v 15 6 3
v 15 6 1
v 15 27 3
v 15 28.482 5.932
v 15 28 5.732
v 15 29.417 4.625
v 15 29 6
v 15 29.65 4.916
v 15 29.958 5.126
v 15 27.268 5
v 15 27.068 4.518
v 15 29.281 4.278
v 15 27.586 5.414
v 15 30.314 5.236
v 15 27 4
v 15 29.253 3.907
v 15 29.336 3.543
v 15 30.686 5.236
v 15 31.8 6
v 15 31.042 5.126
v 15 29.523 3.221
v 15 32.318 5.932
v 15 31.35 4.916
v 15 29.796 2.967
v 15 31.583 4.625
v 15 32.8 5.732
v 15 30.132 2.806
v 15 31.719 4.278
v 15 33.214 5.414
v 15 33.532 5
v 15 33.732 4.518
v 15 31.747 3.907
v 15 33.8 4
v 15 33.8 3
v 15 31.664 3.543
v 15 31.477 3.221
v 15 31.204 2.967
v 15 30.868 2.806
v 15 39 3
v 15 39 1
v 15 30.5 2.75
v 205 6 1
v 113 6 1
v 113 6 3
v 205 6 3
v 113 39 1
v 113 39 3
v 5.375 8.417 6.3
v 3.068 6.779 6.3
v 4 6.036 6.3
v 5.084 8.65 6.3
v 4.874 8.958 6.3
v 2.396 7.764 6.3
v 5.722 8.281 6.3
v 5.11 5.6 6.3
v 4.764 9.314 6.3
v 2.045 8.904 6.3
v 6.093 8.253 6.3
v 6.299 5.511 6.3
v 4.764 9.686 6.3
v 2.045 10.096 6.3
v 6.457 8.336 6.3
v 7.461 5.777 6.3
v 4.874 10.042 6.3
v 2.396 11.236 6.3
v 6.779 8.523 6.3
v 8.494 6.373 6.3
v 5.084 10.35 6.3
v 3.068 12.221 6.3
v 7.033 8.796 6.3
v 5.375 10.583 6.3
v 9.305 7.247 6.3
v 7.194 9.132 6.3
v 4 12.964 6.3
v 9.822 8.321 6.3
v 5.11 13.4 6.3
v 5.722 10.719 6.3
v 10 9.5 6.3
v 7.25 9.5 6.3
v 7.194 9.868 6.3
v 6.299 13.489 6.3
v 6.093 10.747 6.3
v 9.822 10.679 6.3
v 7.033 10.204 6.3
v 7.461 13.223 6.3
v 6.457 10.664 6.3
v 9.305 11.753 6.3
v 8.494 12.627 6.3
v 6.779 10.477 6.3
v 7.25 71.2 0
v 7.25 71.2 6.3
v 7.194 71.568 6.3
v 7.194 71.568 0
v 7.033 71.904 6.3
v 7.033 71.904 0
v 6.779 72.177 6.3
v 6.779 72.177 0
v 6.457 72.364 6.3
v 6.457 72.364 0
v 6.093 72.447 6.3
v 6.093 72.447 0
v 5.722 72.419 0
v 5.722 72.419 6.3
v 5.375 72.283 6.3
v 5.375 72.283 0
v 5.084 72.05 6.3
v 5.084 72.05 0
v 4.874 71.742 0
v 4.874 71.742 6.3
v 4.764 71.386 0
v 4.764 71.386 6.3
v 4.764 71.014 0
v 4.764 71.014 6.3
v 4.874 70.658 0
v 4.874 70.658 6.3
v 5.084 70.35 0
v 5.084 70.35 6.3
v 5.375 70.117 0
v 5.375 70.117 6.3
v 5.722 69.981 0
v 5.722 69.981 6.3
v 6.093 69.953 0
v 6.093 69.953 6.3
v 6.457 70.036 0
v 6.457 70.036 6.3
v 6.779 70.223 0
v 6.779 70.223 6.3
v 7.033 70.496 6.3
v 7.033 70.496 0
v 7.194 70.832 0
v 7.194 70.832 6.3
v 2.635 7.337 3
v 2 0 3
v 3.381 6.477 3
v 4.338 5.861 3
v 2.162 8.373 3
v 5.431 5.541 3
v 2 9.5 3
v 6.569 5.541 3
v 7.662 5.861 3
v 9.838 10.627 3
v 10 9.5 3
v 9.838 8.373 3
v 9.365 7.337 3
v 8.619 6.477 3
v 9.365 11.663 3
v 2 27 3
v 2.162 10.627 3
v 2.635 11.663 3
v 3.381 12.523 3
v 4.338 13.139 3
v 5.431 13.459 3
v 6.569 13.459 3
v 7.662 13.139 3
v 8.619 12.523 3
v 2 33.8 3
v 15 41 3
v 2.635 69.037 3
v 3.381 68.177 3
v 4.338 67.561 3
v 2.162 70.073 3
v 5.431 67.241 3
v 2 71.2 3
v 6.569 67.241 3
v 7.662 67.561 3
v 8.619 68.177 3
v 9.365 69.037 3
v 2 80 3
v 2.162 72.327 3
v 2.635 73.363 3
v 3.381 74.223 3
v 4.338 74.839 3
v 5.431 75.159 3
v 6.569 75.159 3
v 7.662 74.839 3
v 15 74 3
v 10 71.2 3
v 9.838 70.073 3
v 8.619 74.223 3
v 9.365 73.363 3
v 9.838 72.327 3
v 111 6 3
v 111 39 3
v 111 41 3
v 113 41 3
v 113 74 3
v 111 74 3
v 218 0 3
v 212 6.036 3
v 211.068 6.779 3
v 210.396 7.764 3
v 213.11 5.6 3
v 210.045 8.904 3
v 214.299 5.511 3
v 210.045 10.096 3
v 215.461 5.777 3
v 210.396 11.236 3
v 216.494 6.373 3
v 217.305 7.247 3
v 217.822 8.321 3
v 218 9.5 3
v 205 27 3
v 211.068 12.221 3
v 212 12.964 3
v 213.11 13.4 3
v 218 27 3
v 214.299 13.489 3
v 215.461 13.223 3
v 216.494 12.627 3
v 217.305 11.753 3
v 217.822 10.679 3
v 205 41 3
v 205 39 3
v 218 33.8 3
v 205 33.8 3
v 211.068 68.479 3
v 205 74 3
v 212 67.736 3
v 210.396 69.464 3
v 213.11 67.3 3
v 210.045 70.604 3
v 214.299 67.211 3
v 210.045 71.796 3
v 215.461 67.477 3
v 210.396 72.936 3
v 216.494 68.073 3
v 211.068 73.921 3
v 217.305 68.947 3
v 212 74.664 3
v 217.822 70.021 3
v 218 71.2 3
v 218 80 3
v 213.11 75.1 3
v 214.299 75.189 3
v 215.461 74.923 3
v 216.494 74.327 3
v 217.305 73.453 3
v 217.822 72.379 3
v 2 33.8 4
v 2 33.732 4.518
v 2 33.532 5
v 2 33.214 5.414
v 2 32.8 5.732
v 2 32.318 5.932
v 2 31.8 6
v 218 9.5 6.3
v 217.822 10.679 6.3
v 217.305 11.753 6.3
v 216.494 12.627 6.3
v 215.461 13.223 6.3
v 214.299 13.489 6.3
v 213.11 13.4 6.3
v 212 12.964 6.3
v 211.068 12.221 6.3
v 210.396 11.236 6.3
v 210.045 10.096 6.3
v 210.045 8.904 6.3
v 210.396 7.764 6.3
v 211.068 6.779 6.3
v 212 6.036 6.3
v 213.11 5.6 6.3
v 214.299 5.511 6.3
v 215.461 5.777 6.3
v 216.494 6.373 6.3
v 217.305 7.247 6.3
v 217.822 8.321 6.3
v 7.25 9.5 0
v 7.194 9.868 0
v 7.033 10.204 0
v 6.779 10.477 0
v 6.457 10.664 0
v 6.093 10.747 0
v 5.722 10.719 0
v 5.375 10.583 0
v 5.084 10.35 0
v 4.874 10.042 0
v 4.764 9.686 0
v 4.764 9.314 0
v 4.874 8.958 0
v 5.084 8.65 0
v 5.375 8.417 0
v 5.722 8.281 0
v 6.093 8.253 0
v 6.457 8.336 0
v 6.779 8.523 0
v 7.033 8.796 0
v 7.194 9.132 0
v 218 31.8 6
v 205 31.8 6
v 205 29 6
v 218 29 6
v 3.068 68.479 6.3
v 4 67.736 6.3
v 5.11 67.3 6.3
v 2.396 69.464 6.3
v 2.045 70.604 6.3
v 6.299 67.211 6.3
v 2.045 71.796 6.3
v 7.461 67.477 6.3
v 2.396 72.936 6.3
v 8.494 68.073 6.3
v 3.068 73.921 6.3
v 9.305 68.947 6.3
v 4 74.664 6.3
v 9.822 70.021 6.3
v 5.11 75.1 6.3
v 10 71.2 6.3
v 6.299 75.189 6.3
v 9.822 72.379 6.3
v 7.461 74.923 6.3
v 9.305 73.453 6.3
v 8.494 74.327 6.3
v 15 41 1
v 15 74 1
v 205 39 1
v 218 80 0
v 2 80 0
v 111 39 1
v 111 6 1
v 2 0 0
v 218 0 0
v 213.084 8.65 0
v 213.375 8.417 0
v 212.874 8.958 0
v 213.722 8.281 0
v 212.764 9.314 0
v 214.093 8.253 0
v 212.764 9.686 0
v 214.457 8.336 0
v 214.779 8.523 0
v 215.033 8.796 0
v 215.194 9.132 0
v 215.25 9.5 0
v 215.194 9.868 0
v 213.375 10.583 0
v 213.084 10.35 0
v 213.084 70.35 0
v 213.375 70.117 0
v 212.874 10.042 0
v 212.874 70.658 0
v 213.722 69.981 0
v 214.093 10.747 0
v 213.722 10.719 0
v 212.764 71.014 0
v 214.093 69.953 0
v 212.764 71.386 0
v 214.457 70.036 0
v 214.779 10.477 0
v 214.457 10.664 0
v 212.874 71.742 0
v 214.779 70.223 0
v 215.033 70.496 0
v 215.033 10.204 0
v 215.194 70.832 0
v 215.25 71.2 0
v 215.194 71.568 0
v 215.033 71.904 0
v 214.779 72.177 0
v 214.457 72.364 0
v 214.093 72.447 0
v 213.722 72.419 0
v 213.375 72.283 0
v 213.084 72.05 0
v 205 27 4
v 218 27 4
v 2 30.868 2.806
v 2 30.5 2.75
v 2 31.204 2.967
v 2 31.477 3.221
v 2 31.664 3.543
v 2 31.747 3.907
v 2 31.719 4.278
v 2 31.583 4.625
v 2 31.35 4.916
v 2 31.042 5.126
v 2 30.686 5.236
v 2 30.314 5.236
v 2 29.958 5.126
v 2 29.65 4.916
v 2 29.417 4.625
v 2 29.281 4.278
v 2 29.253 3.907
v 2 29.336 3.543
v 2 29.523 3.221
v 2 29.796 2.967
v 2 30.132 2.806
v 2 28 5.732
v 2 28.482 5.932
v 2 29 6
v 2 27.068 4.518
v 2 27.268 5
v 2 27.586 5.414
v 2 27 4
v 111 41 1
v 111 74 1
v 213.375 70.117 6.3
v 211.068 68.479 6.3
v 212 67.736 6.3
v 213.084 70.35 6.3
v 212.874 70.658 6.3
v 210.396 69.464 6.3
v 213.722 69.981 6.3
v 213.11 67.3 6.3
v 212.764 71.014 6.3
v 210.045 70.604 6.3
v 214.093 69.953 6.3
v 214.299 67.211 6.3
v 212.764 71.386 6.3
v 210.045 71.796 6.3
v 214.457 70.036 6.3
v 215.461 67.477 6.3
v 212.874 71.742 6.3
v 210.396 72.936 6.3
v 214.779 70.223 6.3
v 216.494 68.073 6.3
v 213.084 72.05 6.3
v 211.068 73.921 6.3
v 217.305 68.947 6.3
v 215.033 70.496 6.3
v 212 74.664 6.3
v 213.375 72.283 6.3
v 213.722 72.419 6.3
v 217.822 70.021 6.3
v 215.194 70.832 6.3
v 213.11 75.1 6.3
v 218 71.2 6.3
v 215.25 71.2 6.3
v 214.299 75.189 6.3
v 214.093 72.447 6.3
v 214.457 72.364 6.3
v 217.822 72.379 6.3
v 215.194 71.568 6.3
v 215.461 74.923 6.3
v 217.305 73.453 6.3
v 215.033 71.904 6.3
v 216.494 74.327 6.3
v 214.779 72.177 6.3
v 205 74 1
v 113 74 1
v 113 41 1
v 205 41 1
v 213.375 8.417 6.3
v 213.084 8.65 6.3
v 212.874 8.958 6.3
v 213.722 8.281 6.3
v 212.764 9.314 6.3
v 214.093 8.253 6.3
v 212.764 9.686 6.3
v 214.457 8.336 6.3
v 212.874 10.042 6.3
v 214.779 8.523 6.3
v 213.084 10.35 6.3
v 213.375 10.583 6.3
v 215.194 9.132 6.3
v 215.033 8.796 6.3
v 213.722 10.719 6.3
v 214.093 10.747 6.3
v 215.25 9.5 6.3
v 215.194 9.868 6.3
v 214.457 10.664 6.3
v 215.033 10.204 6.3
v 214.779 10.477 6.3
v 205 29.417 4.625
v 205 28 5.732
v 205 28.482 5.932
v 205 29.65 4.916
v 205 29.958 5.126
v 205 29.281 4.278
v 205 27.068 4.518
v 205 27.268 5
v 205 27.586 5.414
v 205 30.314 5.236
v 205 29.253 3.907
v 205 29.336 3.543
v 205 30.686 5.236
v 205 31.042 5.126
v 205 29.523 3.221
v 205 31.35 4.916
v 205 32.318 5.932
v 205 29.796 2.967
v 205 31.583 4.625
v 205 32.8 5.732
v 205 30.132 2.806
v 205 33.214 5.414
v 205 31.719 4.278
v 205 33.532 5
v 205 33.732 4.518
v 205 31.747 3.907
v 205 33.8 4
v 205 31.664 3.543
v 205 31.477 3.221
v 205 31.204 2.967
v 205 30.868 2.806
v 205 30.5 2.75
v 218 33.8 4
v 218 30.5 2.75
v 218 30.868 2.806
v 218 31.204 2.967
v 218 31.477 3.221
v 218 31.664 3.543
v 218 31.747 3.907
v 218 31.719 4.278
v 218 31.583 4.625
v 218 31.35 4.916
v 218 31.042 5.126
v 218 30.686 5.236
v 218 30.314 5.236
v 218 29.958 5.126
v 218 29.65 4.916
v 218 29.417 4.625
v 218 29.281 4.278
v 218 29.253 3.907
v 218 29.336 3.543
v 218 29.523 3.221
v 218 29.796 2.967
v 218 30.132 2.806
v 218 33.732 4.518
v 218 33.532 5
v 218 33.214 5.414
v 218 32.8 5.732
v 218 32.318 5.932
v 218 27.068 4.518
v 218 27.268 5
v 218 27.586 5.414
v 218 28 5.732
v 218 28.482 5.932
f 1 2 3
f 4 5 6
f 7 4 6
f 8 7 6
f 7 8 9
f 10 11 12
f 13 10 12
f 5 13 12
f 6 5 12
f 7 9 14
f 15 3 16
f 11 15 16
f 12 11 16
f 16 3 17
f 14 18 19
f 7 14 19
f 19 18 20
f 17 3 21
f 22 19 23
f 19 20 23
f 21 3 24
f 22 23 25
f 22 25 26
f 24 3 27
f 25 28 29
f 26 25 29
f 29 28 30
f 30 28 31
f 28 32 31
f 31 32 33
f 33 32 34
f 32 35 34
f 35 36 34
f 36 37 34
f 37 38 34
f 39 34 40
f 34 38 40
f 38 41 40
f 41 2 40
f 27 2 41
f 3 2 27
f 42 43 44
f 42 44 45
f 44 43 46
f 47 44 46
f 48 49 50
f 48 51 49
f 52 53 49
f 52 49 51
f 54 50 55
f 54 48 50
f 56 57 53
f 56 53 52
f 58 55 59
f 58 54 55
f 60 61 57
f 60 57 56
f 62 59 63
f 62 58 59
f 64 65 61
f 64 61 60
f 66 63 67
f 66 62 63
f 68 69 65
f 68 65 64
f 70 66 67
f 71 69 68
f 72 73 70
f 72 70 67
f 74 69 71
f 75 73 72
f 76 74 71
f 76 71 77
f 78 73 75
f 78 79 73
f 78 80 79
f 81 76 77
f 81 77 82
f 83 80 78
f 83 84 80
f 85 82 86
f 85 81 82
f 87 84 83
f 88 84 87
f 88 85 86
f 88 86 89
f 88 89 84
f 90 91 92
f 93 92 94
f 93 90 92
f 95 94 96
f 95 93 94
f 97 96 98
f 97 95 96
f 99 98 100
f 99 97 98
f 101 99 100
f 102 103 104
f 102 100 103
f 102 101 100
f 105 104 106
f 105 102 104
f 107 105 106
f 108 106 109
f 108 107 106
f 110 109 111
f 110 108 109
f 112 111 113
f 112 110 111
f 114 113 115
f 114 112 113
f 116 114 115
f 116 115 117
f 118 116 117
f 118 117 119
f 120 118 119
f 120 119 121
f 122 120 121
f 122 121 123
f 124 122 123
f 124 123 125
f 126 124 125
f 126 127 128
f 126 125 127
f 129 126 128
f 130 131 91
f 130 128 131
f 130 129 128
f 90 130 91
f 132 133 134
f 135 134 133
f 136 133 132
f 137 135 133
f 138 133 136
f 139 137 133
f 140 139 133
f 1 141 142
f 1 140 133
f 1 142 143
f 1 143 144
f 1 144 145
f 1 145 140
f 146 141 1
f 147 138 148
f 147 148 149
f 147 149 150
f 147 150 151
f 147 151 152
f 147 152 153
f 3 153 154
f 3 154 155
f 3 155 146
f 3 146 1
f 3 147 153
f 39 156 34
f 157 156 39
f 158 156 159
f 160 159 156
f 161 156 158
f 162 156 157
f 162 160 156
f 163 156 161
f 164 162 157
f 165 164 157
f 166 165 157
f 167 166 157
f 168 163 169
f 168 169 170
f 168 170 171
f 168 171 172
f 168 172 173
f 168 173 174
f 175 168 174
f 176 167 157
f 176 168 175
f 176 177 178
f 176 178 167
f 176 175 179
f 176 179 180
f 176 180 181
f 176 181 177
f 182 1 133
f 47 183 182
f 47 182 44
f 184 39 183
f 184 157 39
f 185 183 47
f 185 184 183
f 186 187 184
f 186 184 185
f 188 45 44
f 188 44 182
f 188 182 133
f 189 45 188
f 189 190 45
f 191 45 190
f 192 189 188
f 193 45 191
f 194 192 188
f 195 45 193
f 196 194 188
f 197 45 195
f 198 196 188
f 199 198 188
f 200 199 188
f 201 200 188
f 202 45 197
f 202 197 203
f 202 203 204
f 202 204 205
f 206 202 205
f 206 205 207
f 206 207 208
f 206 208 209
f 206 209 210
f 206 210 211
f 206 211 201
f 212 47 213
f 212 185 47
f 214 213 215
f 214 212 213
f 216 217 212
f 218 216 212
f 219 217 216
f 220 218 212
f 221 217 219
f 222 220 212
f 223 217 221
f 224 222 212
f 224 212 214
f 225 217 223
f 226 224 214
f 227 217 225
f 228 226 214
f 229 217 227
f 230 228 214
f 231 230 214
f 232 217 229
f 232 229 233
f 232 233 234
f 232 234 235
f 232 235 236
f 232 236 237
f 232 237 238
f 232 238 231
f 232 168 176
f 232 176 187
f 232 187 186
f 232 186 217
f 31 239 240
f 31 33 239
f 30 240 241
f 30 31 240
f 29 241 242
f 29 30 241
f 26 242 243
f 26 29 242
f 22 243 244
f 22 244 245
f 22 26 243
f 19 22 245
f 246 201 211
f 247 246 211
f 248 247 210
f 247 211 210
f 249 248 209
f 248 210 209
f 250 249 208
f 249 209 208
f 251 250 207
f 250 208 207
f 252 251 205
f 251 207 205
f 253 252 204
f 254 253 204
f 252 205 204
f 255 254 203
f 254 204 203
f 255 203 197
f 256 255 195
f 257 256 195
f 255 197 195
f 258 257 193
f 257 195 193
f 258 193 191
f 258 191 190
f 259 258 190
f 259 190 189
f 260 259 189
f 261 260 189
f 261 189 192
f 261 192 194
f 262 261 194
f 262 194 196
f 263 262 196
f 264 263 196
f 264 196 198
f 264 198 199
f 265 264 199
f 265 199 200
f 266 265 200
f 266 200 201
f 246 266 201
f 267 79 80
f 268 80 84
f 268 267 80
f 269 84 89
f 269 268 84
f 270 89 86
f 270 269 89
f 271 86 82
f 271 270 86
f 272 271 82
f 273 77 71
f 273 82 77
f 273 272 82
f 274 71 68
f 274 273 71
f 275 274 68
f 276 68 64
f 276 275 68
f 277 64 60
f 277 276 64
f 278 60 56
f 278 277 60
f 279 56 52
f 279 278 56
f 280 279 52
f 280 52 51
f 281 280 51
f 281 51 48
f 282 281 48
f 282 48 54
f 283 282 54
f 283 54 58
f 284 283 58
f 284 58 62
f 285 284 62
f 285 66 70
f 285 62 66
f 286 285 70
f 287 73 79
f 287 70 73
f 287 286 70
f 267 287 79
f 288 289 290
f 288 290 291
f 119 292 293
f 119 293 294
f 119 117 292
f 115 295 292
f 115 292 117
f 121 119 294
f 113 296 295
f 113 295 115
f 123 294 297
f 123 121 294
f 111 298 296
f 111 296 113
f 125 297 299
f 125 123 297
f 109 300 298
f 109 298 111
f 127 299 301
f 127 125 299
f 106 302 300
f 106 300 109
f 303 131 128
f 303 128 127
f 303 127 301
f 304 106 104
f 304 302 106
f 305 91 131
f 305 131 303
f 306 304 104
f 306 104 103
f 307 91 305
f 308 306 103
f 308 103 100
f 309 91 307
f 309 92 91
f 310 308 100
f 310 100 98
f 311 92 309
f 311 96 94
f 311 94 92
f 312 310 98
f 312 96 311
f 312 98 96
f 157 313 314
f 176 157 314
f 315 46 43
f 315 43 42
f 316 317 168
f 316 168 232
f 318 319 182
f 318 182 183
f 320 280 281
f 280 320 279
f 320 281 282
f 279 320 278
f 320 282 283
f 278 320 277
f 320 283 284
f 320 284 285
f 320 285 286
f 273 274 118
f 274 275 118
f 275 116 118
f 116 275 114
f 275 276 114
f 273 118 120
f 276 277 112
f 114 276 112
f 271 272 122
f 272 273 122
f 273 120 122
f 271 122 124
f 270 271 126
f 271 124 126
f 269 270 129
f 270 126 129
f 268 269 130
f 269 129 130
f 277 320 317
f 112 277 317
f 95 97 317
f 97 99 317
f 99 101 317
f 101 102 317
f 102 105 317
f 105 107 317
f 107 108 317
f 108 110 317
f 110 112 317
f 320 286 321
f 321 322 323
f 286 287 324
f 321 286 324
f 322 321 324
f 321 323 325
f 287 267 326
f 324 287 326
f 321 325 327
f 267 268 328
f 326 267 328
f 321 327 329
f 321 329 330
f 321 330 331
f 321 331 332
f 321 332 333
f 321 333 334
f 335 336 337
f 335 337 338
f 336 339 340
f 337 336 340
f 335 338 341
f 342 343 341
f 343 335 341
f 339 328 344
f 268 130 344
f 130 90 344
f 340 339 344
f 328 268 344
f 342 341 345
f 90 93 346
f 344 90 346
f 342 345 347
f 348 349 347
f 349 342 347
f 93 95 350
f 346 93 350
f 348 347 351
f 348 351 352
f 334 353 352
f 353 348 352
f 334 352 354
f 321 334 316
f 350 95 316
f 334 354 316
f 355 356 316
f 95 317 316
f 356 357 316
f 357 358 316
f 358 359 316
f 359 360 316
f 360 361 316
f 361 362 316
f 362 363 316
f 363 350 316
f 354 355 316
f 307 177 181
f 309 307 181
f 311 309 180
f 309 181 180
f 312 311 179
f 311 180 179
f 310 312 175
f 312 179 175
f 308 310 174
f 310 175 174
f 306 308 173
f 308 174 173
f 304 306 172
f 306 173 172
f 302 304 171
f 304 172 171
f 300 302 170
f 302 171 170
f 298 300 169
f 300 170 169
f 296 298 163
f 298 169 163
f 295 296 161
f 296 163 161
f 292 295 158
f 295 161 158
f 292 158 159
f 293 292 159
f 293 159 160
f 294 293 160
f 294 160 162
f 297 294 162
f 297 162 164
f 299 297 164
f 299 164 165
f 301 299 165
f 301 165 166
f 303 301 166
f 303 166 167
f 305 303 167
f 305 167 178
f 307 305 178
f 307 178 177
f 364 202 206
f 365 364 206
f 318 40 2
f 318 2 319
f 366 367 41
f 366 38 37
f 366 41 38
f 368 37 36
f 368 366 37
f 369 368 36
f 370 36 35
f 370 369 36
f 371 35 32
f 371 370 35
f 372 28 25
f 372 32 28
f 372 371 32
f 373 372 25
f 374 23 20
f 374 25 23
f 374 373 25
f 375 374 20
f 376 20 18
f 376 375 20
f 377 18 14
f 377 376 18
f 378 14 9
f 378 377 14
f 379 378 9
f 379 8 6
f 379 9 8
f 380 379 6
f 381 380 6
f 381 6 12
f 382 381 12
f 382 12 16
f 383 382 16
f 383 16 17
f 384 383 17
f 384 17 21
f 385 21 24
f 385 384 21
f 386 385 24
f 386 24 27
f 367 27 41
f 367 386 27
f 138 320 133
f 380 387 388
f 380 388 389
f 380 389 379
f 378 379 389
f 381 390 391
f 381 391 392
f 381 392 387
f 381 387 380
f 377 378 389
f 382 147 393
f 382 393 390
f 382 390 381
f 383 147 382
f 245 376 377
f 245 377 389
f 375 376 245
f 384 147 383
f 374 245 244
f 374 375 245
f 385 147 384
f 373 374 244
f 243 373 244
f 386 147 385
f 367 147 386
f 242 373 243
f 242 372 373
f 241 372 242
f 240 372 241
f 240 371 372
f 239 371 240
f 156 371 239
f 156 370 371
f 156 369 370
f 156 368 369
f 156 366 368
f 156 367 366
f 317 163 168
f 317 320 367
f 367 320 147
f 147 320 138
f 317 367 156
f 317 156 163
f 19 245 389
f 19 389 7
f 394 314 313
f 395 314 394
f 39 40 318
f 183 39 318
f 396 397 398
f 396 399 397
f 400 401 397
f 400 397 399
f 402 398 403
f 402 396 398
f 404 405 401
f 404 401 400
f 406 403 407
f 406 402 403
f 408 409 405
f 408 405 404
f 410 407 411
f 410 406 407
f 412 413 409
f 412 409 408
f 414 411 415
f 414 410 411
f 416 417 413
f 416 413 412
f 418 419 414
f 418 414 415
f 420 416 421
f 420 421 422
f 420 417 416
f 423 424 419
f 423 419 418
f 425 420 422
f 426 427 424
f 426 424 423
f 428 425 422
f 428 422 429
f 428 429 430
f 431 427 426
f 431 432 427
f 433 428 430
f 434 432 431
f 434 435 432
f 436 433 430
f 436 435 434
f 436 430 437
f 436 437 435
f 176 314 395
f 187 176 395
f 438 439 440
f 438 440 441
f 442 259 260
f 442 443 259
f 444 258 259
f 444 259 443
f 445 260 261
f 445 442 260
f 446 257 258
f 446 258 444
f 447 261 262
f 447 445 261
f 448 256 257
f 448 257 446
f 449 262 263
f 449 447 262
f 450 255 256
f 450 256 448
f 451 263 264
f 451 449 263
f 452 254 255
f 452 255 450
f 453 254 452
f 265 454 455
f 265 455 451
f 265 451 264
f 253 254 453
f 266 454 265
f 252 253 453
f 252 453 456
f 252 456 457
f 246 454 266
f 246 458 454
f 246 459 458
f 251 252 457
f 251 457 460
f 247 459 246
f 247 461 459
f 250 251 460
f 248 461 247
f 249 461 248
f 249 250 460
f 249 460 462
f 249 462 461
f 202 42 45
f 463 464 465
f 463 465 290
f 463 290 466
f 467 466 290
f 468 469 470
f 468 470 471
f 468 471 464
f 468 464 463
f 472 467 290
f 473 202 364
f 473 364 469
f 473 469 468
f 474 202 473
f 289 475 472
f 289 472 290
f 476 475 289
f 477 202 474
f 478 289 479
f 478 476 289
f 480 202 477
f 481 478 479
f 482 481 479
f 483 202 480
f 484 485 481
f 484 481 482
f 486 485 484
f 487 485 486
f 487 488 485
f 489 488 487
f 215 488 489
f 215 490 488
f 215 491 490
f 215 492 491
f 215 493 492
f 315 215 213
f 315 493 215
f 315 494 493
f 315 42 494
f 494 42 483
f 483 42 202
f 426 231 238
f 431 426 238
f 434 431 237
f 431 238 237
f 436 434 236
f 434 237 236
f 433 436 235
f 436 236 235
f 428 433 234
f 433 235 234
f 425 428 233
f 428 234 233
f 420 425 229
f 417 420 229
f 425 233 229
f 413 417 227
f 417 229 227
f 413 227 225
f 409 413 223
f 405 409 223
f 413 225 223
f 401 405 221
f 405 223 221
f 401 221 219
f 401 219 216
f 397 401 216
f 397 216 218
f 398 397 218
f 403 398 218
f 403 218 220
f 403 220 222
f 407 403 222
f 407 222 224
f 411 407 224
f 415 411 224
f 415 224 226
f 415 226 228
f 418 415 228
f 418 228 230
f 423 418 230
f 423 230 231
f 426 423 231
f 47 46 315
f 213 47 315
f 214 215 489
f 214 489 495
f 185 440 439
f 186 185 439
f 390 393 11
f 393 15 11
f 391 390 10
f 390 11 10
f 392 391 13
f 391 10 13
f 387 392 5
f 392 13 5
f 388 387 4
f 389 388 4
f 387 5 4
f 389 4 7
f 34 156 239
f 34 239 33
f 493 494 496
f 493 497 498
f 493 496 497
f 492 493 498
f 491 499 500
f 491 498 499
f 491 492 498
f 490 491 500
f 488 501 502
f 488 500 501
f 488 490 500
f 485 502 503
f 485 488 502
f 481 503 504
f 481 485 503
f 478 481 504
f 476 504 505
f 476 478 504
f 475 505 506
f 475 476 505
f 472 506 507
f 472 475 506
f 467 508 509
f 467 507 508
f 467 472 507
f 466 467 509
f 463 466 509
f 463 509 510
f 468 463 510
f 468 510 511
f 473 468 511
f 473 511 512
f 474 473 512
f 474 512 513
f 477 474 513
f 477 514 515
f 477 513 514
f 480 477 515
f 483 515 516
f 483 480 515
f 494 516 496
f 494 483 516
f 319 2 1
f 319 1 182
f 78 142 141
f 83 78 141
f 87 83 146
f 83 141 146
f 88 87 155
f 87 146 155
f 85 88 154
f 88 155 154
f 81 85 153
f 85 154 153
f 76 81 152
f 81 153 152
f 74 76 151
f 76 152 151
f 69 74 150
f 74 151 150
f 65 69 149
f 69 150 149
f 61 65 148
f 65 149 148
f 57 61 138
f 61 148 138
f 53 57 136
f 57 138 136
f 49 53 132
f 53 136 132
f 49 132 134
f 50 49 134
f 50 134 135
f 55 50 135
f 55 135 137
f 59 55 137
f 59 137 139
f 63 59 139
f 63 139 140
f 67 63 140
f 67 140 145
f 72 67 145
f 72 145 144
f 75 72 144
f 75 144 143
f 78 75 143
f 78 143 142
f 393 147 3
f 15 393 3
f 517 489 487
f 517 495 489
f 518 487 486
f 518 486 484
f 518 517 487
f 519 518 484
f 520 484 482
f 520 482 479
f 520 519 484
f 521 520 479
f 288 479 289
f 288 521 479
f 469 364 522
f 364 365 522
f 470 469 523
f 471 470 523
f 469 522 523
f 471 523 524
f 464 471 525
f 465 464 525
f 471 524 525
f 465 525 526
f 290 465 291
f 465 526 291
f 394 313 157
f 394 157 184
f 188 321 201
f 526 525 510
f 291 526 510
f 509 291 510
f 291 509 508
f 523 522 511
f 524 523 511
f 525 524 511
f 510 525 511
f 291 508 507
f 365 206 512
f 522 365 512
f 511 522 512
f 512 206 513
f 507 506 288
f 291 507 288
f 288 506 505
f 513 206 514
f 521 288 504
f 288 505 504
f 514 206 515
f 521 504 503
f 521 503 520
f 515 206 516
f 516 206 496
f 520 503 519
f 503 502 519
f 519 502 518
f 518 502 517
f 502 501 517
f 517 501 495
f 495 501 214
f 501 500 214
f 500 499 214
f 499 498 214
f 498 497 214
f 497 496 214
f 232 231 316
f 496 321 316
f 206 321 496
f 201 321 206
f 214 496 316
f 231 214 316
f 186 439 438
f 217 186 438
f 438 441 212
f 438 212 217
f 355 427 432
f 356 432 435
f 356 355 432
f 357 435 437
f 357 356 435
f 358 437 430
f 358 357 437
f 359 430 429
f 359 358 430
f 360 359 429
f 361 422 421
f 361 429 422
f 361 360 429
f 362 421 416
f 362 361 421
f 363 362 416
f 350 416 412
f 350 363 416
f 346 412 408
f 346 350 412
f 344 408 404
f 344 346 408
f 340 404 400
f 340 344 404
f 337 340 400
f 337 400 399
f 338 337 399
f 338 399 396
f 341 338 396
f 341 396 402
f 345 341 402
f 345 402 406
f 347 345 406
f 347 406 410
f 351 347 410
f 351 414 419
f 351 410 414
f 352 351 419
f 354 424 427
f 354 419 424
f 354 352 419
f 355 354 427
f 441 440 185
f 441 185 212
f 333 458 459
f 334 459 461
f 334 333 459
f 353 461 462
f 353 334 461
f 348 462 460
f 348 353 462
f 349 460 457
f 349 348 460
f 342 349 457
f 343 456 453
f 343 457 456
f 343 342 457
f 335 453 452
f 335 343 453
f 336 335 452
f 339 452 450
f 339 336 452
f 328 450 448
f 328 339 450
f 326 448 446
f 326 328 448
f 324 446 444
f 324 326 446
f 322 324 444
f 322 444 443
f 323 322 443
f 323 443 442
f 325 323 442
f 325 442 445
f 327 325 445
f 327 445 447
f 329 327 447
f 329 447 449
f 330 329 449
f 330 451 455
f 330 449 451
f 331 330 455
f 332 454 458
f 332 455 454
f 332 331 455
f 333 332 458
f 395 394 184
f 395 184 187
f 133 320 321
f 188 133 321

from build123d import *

# Parameters (mm, degrees)
CYLINDER010_R     = 1.25
CYLINDER010_DEPTH = 20
CYLINDER011_R     = 1.25
CYLINDER011_DEPTH = 20
BOX009_W          = 13
BOX009_H          = 6.8
BOX009_DEPTH      = 6
FILLET002_R       = 2
CYLINDER004_R     = 1.25
CYLINDER004_DEPTH = 7
CYLINDER002_R     = 1.25
CYLINDER002_DEPTH = 7
CYLINDER003_R     = 1.25
CYLINDER003_DEPTH = 7
CYLINDER_R        = 1.25
CYLINDER_DEPTH    = 7
BOX002_W          = 190
BOX002_H          = 68
BOX002_DEPTH      = 3
CYLINDER005_R     = 4
CYLINDER005_DEPTH = 6.3
CYLINDER006_R     = 4
CYLINDER006_DEPTH = 6.3
CYLINDER001_R     = 4
CYLINDER001_DEPTH = 6.3
BOX_W             = 216
BOX_H             = 80
BOX_DEPTH         = 3
CYLINDER007_R     = 4
CYLINDER007_DEPTH = 6.3
BOX003_W          = 2
BOX003_H          = 68
BOX003_DEPTH      = 2
BOX004_W          = 190
BOX004_H          = 2
BOX004_DEPTH      = 2
BOX021_W          = 13
BOX021_H          = 6.8
BOX021_DEPTH      = 6
FILLET002004_R    = 2


with BuildPart() as cylinder009:
    # Cylinder010 → Cylinder010 (new body)
    with BuildSketch(Plane(origin=(0, 30.5, 4), x_dir=(0, 0, -1), z_dir=(1, 0, 0))):
        Circle(CYLINDER010_R)
    extrude(amount=CYLINDER010_DEPTH)


with BuildPart() as fusion005:
    # Cylinder011 → Cylinder011 (new body)
    with BuildSketch(Plane(origin=(204, 30.5, 4), x_dir=(0, 0, -1), z_dir=(1, 0, 0))):
        Circle(CYLINDER011_R)
    extrude(amount=CYLINDER011_DEPTH)

    # Fusion005: union Cylinder009
    add(cylinder009.part)


with BuildPart() as fillet002:
    # Box009 → Box009 (new body)
    with BuildSketch(Plane(origin=(2, 29, 0), x_dir=(1, 0, 0), z_dir=(0, 0, 1))):
        with Locations((6.5, 3.4)):
            Rectangle(BOX009_W, BOX009_H)
    extrude(amount=BOX009_DEPTH)

    # Fillet002
    fillet002_edges = [fillet002.edges().sort_by_distance(p)[0] for p in [
        (8.5, 29, 6),
        (8.5, 35.8, 6),
    ]]
    fillet(fillet002_edges, radius=FILLET002_R)


with BuildPart() as fillet002_1:
    # Fillet002 placement: moved
    add(fillet002.part.moved(Location((0, -2, 0))))


with BuildPart() as screwhole003:
    # Cylinder004 → Cylinder004 (new body)
    with BuildSketch(Plane(origin=(214, 9.5, 0), x_dir=(1, 0, 0), z_dir=(0, 0, 1))):
        Circle(CYLINDER004_R)
    extrude(amount=CYLINDER004_DEPTH)


with BuildPart() as screwhole001:
    # Cylinder002 → Cylinder002 (new body)
    with BuildSketch(Plane(origin=(6, 71.2, 0), x_dir=(1, 0, 0), z_dir=(0, 0, 1))):
        Circle(CYLINDER002_R)
    extrude(amount=CYLINDER002_DEPTH)


with BuildPart() as screwhole002:
    # Cylinder003 → Cylinder003 (new body)
    with BuildSketch(Plane(origin=(214, 71.2, 0), x_dir=(1, 0, 0), z_dir=(0, 0, 1))):
        Circle(CYLINDER003_R)
    extrude(amount=CYLINDER003_DEPTH)


with BuildPart() as screwhole:
    # Cylinder → Cylinder (new body)
    with BuildSketch(Plane(origin=(6, 9.5, 0), x_dir=(1, 0, 0), z_dir=(0, 0, 1))):
        Circle(CYLINDER_R)
    extrude(amount=CYLINDER_DEPTH)


with BuildPart() as baseholes:
    # Box002 → Box002 (new body)
    with BuildSketch(Plane(origin=(15, 6, 1), x_dir=(1, 0, 0), z_dir=(0, 0, 1))):
        with Locations((95, 34)):
            Rectangle(BOX002_W, BOX002_H)
    extrude(amount=BOX002_DEPTH)

    # Fusion: union ScrewHole003, ScrewHole001, ScrewHole002, ScrewHole
    add(screwhole003.part)
    add(screwhole001.part)
    add(screwhole002.part)
    add(screwhole.part)


with BuildPart() as cylinder005:
    # Cylinder005 → Cylinder005 (new body)
    with BuildSketch(Plane(origin=(6, 71.2, 0), x_dir=(1, 0, 0), z_dir=(0, 0, 1))):
        Circle(CYLINDER005_R)
    extrude(amount=CYLINDER005_DEPTH)


with BuildPart() as cylinder006:
    # Cylinder006 → Cylinder006 (new body)
    with BuildSketch(Plane(origin=(214, 71.2, 0), x_dir=(1, 0, 0), z_dir=(0, 0, 1))):
        Circle(CYLINDER006_R)
    extrude(amount=CYLINDER006_DEPTH)


with BuildPart() as cylinder001:
    # Cylinder001 → Cylinder001 (new body)
    with BuildSketch(Plane(origin=(6, 9.5, 0), x_dir=(1, 0, 0), z_dir=(0, 0, 1))):
        Circle(CYLINDER001_R)
    extrude(amount=CYLINDER001_DEPTH)


with BuildPart() as base:
    # Box → Box (new body)
    with BuildSketch(Plane(origin=(2, 0, 0), x_dir=(1, 0, 0), z_dir=(0, 0, 1))):
        with Locations((108, 40)):
            Rectangle(BOX_W, BOX_H)
    extrude(amount=BOX_DEPTH)


with BuildPart() as basesubstraction:
    # Cylinder007 → Cylinder007 (new body)
    with BuildSketch(Plane(origin=(214, 9.5, 0), x_dir=(1, 0, 0), z_dir=(0, 0, 1))):
        Circle(CYLINDER007_R)
    extrude(amount=CYLINDER007_DEPTH)

    # Fusion001: union Cylinder005, Cylinder006, Cylinder001, Base
    add(cylinder005.part)
    add(cylinder006.part)
    add(cylinder001.part)
    add(base.part)

    # Cut: cut BaseHoles
    add(baseholes.part, mode=Mode.SUBTRACT)


with BuildPart() as reinforce:
    # Box003 → Box003 (new body)
    with BuildSketch(Plane(origin=(111, 6, 1), x_dir=(1, 0, 0), z_dir=(0, 0, 1))):
        with Locations((1, 34)):
            Rectangle(BOX003_W, BOX003_H)
    extrude(amount=BOX003_DEPTH)


with BuildPart() as reinforce001:
    # Box004 → Box004 (new body)
    with BuildSketch(Plane(origin=(15, 39, 1), x_dir=(1, 0, 0), z_dir=(0, 0, 1))):
        with Locations((95, 1)):
            Rectangle(BOX004_W, BOX004_H)
    extrude(amount=BOX004_DEPTH)


with BuildPart() as bottom:
    # Box021 → Box021 (new body)
    with BuildSketch(Plane(origin=(2, 29, 0), x_dir=(1, 0, 0), z_dir=(0, 0, 1))):
        with Locations((6.5, 3.4)):
            Rectangle(BOX021_W, BOX021_H)
    extrude(amount=BOX021_DEPTH)

    # Fillet002004
    fillet002004_edges = [bottom.edges().sort_by_distance(p)[0] for p in [
        (8.5, 29, 6),
        (8.5, 35.8, 6),
    ]]
    fillet(fillet002004_edges, radius=FILLET002004_R)


with BuildPart() as bottom_1:
    # Fillet002004 placement: moved
    add(bottom.part.moved(Location((203, -2, 0))))

    # Fusion008: union Fillet002, BaseSubstraction, Reinforce, Reinforce001
    add(fillet002_1.part)
    add(basesubstraction.part)
    add(reinforce.part)
    add(reinforce001.part)

    # Cut001006: cut Fusion005
    add(fusion005.part, mode=Mode.SUBTRACT)


solid = bottom_1.part
